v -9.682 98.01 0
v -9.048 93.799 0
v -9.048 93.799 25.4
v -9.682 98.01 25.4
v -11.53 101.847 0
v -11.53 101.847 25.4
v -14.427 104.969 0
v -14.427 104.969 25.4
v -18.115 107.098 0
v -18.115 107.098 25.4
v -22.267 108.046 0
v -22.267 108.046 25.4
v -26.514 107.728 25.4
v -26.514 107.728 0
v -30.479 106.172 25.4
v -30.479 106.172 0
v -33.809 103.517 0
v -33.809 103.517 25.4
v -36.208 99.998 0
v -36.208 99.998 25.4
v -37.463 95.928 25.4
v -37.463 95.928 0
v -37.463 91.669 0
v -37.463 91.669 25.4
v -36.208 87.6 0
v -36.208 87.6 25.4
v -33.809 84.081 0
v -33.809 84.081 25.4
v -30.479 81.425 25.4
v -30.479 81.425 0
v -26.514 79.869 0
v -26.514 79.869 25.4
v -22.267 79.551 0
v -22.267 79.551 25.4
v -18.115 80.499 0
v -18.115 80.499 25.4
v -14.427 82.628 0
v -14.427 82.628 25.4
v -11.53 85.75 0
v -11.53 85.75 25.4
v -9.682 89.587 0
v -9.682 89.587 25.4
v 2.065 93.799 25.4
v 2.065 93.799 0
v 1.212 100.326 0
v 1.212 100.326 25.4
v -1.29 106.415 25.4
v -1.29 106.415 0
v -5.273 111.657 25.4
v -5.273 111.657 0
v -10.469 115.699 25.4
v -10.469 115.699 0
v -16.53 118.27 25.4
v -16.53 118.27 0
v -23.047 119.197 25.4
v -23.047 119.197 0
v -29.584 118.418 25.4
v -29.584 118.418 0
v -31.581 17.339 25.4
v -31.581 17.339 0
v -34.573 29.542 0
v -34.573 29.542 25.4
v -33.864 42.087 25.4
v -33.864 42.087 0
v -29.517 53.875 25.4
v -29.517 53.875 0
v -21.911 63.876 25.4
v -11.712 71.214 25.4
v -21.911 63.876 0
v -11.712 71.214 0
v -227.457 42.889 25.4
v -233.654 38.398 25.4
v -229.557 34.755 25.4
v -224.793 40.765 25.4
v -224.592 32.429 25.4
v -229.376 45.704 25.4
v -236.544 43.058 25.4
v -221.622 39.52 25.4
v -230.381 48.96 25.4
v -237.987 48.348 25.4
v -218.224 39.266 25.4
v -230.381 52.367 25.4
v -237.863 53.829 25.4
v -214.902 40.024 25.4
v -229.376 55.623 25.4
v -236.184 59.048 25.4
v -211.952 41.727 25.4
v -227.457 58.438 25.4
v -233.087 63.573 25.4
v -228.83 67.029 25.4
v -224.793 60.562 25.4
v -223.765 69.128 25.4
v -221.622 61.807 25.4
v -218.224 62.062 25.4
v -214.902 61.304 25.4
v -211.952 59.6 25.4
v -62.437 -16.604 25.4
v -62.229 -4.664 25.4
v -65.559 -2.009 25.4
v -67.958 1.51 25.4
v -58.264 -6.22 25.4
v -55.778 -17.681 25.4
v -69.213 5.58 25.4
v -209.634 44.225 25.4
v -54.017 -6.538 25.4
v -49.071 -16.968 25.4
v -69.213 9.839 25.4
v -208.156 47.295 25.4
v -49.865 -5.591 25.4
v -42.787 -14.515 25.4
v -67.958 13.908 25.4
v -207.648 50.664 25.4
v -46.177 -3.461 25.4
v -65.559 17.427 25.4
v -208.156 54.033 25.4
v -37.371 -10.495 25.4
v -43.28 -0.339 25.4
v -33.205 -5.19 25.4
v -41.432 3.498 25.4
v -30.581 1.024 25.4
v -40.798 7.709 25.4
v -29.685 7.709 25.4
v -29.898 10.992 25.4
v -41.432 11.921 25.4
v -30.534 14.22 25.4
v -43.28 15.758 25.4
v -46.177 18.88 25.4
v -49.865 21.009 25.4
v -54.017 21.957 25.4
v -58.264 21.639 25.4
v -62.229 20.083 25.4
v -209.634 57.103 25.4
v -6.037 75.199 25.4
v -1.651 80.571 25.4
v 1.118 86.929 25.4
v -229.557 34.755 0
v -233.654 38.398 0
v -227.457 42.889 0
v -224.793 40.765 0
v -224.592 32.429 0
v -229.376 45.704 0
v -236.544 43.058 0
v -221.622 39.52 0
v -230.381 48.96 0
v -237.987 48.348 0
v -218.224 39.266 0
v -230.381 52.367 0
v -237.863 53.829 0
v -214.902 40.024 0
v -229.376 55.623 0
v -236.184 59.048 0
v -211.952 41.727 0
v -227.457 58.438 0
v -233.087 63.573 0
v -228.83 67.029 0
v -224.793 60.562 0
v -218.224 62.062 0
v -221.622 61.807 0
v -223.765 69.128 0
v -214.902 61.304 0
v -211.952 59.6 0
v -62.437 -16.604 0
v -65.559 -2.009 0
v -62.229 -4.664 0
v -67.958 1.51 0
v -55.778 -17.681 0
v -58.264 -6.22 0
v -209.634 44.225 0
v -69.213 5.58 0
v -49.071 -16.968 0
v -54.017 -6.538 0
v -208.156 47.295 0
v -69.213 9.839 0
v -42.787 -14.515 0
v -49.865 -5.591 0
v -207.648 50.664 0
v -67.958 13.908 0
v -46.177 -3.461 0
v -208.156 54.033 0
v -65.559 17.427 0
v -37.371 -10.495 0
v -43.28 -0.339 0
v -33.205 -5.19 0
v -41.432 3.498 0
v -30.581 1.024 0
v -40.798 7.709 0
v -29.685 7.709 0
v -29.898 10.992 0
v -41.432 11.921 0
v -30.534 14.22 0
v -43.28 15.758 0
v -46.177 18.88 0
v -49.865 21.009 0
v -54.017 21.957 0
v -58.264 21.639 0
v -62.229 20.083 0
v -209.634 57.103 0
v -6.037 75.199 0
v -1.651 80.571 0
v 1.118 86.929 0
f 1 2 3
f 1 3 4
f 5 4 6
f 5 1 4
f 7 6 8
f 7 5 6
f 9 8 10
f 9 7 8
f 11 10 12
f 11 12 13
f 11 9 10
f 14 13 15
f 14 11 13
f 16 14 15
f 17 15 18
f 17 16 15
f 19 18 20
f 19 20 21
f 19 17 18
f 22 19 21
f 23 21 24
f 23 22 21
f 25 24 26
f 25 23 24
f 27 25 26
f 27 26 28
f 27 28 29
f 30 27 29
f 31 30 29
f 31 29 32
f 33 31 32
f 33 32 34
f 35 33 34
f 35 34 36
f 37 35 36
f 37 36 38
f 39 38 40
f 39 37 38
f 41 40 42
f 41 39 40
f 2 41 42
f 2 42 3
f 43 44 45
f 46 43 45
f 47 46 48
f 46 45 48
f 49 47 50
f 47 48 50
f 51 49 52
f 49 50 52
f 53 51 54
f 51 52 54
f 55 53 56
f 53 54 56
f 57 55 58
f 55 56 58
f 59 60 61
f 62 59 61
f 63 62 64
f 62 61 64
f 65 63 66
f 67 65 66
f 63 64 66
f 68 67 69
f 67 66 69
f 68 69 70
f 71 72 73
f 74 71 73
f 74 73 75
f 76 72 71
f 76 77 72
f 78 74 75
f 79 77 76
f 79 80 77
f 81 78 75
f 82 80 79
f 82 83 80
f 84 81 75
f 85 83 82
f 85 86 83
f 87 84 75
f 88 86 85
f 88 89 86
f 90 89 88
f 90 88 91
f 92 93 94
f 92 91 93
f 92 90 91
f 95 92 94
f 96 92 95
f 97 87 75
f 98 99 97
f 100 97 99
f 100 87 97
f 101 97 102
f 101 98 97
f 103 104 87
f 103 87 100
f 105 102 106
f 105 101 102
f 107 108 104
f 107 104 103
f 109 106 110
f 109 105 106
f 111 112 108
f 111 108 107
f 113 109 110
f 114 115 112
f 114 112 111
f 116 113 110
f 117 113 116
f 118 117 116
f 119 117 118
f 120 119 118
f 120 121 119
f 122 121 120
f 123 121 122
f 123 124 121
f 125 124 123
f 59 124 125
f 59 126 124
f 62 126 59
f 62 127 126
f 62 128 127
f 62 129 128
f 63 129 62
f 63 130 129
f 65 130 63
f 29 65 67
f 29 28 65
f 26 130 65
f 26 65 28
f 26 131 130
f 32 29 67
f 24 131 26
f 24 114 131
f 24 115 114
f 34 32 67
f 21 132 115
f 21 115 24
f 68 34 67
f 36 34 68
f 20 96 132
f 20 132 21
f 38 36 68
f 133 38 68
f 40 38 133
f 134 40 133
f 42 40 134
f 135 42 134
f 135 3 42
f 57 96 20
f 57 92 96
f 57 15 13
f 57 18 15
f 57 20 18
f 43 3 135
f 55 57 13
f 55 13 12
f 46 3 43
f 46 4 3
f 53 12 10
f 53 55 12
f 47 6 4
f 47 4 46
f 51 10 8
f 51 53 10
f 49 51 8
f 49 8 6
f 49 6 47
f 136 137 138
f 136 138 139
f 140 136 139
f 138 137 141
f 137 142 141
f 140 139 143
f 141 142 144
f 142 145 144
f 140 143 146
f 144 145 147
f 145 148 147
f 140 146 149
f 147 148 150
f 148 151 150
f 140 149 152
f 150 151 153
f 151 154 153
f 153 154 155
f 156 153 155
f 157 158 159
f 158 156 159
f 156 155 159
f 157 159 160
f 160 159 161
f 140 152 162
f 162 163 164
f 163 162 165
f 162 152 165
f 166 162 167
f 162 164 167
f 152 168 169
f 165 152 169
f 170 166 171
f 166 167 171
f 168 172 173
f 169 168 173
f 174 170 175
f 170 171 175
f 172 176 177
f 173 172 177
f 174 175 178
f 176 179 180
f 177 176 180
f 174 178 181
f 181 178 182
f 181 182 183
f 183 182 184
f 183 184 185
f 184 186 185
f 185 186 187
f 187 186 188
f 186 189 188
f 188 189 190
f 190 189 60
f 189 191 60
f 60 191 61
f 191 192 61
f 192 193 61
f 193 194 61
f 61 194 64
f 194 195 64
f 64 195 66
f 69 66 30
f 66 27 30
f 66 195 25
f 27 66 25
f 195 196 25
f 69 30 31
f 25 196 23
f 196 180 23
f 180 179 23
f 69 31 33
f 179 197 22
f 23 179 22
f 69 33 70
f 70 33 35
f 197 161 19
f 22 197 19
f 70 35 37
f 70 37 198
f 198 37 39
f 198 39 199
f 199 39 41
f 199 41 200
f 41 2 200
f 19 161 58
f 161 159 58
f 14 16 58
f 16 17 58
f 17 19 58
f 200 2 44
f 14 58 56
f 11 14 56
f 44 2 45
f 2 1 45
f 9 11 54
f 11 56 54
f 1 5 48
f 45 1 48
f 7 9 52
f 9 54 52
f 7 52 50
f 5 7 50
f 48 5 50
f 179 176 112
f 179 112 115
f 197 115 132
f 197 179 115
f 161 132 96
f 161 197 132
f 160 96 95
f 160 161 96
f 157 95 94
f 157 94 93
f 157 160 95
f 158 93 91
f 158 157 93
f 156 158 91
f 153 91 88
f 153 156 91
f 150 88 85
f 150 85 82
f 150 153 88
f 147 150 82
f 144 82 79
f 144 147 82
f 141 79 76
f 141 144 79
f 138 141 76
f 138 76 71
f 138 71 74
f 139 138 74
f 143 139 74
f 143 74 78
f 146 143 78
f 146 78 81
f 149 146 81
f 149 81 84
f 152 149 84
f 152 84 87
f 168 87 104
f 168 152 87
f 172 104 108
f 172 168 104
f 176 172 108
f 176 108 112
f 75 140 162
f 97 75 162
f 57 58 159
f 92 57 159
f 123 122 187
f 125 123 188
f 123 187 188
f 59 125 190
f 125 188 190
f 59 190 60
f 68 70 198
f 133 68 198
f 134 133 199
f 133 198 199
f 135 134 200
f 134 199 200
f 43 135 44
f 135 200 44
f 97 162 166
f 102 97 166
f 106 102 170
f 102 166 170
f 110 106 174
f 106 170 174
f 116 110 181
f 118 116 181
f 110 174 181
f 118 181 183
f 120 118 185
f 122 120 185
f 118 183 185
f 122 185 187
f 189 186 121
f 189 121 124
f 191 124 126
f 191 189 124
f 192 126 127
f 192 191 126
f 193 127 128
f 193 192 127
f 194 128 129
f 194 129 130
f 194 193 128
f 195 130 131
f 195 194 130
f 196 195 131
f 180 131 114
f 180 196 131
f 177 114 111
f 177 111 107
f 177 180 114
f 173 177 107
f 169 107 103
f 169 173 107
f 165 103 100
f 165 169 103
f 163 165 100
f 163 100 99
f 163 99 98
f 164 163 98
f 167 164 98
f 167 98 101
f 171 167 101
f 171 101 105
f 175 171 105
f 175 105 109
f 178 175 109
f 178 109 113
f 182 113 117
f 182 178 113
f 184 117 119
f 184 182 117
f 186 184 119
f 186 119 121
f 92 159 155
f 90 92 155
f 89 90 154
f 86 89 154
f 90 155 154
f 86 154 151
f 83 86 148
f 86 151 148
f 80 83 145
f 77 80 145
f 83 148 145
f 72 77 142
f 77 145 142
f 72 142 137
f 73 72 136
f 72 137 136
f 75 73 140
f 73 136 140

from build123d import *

# Parameters (mm, degrees)
F0_R     = 11.43
F0_R_2   = 14.2875
F1_DEPTH = 25.4


with BuildPart() as f1:
    # F0 (on Top) → F1 (new body)
    with BuildSketch(Plane.XY):
        with BuildLine():
            ThreePointArc((-223.765199, 69.128216), (-207.381781, 65.700199), (-200.028299, 50.663778))
            ThreePointArc((-200.028299, 50.663778), (-207.723462, 35.367694), (-224.592098, 32.429181))
            Line((-224.592098, 32.429181), (-62.436875, -16.603506))
            ThreePointArc((-62.436875, -16.603506), (-73.880053, 24.794703), (-31.581428, 17.33921))
            ThreePointArc((-31.581428, 17.33921), (-32.128705, 48.14231), (-11.712275, 71.213935))
            ThreePointArc((-11.712275, 71.213935), (-47.089563, 84.80489), (-29.584343, 118.417891))
            Line((-29.584343, 118.417891), (-223.765199, 69.128216))
        make_face()
        with BuildLine():
            ThreePointArc((-224.592098, 32.429181), (-207.723462, 35.367694), (-200.028299, 50.663778))
            ThreePointArc((-200.028299, 50.663778), (-207.381781, 65.700199), (-223.765199, 69.128216))
            ThreePointArc((-223.765199, 69.128216), (-238.123465, 51.092902), (-224.592098, 32.429181))
        make_face()
        with Locations((-219.078299, 50.663778)):
            Circle(F0_R, mode=Mode.SUBTRACT)
        with BuildLine():
            ThreePointArc((2.064857, 93.79864), (-7.739786, 113.847202), (-29.584343, 118.417891))
            ThreePointArc((-29.584343, 118.417891), (-47.089563, 84.80489), (-11.712275, 71.213935))
            ThreePointArc((-11.712275, 71.213935), (-1.651268, 80.571034), (2.064857, 93.79864))
        make_face()
        with Locations((-23.335143, 93.79864)):
            Circle(F0_R_2, mode=Mode.SUBTRACT)
        with BuildLine():
            ThreePointArc((-31.581428, 17.33921), (-73.880053, 24.794703), (-62.436875, -16.603506))
            ThreePointArc((-62.436875, -16.603506), (-39.945361, -12.685489), (-29.685143, 7.70929))
            ThreePointArc((-29.685143, 7.70929), (-30.163723, 12.616714), (-31.581428, 17.33921))
        make_face()
        with Locations((-55.085143, 7.70929)):
            Circle(F0_R_2, mode=Mode.SUBTRACT)
    extrude(amount=F1_DEPTH)


solid = f1.part
